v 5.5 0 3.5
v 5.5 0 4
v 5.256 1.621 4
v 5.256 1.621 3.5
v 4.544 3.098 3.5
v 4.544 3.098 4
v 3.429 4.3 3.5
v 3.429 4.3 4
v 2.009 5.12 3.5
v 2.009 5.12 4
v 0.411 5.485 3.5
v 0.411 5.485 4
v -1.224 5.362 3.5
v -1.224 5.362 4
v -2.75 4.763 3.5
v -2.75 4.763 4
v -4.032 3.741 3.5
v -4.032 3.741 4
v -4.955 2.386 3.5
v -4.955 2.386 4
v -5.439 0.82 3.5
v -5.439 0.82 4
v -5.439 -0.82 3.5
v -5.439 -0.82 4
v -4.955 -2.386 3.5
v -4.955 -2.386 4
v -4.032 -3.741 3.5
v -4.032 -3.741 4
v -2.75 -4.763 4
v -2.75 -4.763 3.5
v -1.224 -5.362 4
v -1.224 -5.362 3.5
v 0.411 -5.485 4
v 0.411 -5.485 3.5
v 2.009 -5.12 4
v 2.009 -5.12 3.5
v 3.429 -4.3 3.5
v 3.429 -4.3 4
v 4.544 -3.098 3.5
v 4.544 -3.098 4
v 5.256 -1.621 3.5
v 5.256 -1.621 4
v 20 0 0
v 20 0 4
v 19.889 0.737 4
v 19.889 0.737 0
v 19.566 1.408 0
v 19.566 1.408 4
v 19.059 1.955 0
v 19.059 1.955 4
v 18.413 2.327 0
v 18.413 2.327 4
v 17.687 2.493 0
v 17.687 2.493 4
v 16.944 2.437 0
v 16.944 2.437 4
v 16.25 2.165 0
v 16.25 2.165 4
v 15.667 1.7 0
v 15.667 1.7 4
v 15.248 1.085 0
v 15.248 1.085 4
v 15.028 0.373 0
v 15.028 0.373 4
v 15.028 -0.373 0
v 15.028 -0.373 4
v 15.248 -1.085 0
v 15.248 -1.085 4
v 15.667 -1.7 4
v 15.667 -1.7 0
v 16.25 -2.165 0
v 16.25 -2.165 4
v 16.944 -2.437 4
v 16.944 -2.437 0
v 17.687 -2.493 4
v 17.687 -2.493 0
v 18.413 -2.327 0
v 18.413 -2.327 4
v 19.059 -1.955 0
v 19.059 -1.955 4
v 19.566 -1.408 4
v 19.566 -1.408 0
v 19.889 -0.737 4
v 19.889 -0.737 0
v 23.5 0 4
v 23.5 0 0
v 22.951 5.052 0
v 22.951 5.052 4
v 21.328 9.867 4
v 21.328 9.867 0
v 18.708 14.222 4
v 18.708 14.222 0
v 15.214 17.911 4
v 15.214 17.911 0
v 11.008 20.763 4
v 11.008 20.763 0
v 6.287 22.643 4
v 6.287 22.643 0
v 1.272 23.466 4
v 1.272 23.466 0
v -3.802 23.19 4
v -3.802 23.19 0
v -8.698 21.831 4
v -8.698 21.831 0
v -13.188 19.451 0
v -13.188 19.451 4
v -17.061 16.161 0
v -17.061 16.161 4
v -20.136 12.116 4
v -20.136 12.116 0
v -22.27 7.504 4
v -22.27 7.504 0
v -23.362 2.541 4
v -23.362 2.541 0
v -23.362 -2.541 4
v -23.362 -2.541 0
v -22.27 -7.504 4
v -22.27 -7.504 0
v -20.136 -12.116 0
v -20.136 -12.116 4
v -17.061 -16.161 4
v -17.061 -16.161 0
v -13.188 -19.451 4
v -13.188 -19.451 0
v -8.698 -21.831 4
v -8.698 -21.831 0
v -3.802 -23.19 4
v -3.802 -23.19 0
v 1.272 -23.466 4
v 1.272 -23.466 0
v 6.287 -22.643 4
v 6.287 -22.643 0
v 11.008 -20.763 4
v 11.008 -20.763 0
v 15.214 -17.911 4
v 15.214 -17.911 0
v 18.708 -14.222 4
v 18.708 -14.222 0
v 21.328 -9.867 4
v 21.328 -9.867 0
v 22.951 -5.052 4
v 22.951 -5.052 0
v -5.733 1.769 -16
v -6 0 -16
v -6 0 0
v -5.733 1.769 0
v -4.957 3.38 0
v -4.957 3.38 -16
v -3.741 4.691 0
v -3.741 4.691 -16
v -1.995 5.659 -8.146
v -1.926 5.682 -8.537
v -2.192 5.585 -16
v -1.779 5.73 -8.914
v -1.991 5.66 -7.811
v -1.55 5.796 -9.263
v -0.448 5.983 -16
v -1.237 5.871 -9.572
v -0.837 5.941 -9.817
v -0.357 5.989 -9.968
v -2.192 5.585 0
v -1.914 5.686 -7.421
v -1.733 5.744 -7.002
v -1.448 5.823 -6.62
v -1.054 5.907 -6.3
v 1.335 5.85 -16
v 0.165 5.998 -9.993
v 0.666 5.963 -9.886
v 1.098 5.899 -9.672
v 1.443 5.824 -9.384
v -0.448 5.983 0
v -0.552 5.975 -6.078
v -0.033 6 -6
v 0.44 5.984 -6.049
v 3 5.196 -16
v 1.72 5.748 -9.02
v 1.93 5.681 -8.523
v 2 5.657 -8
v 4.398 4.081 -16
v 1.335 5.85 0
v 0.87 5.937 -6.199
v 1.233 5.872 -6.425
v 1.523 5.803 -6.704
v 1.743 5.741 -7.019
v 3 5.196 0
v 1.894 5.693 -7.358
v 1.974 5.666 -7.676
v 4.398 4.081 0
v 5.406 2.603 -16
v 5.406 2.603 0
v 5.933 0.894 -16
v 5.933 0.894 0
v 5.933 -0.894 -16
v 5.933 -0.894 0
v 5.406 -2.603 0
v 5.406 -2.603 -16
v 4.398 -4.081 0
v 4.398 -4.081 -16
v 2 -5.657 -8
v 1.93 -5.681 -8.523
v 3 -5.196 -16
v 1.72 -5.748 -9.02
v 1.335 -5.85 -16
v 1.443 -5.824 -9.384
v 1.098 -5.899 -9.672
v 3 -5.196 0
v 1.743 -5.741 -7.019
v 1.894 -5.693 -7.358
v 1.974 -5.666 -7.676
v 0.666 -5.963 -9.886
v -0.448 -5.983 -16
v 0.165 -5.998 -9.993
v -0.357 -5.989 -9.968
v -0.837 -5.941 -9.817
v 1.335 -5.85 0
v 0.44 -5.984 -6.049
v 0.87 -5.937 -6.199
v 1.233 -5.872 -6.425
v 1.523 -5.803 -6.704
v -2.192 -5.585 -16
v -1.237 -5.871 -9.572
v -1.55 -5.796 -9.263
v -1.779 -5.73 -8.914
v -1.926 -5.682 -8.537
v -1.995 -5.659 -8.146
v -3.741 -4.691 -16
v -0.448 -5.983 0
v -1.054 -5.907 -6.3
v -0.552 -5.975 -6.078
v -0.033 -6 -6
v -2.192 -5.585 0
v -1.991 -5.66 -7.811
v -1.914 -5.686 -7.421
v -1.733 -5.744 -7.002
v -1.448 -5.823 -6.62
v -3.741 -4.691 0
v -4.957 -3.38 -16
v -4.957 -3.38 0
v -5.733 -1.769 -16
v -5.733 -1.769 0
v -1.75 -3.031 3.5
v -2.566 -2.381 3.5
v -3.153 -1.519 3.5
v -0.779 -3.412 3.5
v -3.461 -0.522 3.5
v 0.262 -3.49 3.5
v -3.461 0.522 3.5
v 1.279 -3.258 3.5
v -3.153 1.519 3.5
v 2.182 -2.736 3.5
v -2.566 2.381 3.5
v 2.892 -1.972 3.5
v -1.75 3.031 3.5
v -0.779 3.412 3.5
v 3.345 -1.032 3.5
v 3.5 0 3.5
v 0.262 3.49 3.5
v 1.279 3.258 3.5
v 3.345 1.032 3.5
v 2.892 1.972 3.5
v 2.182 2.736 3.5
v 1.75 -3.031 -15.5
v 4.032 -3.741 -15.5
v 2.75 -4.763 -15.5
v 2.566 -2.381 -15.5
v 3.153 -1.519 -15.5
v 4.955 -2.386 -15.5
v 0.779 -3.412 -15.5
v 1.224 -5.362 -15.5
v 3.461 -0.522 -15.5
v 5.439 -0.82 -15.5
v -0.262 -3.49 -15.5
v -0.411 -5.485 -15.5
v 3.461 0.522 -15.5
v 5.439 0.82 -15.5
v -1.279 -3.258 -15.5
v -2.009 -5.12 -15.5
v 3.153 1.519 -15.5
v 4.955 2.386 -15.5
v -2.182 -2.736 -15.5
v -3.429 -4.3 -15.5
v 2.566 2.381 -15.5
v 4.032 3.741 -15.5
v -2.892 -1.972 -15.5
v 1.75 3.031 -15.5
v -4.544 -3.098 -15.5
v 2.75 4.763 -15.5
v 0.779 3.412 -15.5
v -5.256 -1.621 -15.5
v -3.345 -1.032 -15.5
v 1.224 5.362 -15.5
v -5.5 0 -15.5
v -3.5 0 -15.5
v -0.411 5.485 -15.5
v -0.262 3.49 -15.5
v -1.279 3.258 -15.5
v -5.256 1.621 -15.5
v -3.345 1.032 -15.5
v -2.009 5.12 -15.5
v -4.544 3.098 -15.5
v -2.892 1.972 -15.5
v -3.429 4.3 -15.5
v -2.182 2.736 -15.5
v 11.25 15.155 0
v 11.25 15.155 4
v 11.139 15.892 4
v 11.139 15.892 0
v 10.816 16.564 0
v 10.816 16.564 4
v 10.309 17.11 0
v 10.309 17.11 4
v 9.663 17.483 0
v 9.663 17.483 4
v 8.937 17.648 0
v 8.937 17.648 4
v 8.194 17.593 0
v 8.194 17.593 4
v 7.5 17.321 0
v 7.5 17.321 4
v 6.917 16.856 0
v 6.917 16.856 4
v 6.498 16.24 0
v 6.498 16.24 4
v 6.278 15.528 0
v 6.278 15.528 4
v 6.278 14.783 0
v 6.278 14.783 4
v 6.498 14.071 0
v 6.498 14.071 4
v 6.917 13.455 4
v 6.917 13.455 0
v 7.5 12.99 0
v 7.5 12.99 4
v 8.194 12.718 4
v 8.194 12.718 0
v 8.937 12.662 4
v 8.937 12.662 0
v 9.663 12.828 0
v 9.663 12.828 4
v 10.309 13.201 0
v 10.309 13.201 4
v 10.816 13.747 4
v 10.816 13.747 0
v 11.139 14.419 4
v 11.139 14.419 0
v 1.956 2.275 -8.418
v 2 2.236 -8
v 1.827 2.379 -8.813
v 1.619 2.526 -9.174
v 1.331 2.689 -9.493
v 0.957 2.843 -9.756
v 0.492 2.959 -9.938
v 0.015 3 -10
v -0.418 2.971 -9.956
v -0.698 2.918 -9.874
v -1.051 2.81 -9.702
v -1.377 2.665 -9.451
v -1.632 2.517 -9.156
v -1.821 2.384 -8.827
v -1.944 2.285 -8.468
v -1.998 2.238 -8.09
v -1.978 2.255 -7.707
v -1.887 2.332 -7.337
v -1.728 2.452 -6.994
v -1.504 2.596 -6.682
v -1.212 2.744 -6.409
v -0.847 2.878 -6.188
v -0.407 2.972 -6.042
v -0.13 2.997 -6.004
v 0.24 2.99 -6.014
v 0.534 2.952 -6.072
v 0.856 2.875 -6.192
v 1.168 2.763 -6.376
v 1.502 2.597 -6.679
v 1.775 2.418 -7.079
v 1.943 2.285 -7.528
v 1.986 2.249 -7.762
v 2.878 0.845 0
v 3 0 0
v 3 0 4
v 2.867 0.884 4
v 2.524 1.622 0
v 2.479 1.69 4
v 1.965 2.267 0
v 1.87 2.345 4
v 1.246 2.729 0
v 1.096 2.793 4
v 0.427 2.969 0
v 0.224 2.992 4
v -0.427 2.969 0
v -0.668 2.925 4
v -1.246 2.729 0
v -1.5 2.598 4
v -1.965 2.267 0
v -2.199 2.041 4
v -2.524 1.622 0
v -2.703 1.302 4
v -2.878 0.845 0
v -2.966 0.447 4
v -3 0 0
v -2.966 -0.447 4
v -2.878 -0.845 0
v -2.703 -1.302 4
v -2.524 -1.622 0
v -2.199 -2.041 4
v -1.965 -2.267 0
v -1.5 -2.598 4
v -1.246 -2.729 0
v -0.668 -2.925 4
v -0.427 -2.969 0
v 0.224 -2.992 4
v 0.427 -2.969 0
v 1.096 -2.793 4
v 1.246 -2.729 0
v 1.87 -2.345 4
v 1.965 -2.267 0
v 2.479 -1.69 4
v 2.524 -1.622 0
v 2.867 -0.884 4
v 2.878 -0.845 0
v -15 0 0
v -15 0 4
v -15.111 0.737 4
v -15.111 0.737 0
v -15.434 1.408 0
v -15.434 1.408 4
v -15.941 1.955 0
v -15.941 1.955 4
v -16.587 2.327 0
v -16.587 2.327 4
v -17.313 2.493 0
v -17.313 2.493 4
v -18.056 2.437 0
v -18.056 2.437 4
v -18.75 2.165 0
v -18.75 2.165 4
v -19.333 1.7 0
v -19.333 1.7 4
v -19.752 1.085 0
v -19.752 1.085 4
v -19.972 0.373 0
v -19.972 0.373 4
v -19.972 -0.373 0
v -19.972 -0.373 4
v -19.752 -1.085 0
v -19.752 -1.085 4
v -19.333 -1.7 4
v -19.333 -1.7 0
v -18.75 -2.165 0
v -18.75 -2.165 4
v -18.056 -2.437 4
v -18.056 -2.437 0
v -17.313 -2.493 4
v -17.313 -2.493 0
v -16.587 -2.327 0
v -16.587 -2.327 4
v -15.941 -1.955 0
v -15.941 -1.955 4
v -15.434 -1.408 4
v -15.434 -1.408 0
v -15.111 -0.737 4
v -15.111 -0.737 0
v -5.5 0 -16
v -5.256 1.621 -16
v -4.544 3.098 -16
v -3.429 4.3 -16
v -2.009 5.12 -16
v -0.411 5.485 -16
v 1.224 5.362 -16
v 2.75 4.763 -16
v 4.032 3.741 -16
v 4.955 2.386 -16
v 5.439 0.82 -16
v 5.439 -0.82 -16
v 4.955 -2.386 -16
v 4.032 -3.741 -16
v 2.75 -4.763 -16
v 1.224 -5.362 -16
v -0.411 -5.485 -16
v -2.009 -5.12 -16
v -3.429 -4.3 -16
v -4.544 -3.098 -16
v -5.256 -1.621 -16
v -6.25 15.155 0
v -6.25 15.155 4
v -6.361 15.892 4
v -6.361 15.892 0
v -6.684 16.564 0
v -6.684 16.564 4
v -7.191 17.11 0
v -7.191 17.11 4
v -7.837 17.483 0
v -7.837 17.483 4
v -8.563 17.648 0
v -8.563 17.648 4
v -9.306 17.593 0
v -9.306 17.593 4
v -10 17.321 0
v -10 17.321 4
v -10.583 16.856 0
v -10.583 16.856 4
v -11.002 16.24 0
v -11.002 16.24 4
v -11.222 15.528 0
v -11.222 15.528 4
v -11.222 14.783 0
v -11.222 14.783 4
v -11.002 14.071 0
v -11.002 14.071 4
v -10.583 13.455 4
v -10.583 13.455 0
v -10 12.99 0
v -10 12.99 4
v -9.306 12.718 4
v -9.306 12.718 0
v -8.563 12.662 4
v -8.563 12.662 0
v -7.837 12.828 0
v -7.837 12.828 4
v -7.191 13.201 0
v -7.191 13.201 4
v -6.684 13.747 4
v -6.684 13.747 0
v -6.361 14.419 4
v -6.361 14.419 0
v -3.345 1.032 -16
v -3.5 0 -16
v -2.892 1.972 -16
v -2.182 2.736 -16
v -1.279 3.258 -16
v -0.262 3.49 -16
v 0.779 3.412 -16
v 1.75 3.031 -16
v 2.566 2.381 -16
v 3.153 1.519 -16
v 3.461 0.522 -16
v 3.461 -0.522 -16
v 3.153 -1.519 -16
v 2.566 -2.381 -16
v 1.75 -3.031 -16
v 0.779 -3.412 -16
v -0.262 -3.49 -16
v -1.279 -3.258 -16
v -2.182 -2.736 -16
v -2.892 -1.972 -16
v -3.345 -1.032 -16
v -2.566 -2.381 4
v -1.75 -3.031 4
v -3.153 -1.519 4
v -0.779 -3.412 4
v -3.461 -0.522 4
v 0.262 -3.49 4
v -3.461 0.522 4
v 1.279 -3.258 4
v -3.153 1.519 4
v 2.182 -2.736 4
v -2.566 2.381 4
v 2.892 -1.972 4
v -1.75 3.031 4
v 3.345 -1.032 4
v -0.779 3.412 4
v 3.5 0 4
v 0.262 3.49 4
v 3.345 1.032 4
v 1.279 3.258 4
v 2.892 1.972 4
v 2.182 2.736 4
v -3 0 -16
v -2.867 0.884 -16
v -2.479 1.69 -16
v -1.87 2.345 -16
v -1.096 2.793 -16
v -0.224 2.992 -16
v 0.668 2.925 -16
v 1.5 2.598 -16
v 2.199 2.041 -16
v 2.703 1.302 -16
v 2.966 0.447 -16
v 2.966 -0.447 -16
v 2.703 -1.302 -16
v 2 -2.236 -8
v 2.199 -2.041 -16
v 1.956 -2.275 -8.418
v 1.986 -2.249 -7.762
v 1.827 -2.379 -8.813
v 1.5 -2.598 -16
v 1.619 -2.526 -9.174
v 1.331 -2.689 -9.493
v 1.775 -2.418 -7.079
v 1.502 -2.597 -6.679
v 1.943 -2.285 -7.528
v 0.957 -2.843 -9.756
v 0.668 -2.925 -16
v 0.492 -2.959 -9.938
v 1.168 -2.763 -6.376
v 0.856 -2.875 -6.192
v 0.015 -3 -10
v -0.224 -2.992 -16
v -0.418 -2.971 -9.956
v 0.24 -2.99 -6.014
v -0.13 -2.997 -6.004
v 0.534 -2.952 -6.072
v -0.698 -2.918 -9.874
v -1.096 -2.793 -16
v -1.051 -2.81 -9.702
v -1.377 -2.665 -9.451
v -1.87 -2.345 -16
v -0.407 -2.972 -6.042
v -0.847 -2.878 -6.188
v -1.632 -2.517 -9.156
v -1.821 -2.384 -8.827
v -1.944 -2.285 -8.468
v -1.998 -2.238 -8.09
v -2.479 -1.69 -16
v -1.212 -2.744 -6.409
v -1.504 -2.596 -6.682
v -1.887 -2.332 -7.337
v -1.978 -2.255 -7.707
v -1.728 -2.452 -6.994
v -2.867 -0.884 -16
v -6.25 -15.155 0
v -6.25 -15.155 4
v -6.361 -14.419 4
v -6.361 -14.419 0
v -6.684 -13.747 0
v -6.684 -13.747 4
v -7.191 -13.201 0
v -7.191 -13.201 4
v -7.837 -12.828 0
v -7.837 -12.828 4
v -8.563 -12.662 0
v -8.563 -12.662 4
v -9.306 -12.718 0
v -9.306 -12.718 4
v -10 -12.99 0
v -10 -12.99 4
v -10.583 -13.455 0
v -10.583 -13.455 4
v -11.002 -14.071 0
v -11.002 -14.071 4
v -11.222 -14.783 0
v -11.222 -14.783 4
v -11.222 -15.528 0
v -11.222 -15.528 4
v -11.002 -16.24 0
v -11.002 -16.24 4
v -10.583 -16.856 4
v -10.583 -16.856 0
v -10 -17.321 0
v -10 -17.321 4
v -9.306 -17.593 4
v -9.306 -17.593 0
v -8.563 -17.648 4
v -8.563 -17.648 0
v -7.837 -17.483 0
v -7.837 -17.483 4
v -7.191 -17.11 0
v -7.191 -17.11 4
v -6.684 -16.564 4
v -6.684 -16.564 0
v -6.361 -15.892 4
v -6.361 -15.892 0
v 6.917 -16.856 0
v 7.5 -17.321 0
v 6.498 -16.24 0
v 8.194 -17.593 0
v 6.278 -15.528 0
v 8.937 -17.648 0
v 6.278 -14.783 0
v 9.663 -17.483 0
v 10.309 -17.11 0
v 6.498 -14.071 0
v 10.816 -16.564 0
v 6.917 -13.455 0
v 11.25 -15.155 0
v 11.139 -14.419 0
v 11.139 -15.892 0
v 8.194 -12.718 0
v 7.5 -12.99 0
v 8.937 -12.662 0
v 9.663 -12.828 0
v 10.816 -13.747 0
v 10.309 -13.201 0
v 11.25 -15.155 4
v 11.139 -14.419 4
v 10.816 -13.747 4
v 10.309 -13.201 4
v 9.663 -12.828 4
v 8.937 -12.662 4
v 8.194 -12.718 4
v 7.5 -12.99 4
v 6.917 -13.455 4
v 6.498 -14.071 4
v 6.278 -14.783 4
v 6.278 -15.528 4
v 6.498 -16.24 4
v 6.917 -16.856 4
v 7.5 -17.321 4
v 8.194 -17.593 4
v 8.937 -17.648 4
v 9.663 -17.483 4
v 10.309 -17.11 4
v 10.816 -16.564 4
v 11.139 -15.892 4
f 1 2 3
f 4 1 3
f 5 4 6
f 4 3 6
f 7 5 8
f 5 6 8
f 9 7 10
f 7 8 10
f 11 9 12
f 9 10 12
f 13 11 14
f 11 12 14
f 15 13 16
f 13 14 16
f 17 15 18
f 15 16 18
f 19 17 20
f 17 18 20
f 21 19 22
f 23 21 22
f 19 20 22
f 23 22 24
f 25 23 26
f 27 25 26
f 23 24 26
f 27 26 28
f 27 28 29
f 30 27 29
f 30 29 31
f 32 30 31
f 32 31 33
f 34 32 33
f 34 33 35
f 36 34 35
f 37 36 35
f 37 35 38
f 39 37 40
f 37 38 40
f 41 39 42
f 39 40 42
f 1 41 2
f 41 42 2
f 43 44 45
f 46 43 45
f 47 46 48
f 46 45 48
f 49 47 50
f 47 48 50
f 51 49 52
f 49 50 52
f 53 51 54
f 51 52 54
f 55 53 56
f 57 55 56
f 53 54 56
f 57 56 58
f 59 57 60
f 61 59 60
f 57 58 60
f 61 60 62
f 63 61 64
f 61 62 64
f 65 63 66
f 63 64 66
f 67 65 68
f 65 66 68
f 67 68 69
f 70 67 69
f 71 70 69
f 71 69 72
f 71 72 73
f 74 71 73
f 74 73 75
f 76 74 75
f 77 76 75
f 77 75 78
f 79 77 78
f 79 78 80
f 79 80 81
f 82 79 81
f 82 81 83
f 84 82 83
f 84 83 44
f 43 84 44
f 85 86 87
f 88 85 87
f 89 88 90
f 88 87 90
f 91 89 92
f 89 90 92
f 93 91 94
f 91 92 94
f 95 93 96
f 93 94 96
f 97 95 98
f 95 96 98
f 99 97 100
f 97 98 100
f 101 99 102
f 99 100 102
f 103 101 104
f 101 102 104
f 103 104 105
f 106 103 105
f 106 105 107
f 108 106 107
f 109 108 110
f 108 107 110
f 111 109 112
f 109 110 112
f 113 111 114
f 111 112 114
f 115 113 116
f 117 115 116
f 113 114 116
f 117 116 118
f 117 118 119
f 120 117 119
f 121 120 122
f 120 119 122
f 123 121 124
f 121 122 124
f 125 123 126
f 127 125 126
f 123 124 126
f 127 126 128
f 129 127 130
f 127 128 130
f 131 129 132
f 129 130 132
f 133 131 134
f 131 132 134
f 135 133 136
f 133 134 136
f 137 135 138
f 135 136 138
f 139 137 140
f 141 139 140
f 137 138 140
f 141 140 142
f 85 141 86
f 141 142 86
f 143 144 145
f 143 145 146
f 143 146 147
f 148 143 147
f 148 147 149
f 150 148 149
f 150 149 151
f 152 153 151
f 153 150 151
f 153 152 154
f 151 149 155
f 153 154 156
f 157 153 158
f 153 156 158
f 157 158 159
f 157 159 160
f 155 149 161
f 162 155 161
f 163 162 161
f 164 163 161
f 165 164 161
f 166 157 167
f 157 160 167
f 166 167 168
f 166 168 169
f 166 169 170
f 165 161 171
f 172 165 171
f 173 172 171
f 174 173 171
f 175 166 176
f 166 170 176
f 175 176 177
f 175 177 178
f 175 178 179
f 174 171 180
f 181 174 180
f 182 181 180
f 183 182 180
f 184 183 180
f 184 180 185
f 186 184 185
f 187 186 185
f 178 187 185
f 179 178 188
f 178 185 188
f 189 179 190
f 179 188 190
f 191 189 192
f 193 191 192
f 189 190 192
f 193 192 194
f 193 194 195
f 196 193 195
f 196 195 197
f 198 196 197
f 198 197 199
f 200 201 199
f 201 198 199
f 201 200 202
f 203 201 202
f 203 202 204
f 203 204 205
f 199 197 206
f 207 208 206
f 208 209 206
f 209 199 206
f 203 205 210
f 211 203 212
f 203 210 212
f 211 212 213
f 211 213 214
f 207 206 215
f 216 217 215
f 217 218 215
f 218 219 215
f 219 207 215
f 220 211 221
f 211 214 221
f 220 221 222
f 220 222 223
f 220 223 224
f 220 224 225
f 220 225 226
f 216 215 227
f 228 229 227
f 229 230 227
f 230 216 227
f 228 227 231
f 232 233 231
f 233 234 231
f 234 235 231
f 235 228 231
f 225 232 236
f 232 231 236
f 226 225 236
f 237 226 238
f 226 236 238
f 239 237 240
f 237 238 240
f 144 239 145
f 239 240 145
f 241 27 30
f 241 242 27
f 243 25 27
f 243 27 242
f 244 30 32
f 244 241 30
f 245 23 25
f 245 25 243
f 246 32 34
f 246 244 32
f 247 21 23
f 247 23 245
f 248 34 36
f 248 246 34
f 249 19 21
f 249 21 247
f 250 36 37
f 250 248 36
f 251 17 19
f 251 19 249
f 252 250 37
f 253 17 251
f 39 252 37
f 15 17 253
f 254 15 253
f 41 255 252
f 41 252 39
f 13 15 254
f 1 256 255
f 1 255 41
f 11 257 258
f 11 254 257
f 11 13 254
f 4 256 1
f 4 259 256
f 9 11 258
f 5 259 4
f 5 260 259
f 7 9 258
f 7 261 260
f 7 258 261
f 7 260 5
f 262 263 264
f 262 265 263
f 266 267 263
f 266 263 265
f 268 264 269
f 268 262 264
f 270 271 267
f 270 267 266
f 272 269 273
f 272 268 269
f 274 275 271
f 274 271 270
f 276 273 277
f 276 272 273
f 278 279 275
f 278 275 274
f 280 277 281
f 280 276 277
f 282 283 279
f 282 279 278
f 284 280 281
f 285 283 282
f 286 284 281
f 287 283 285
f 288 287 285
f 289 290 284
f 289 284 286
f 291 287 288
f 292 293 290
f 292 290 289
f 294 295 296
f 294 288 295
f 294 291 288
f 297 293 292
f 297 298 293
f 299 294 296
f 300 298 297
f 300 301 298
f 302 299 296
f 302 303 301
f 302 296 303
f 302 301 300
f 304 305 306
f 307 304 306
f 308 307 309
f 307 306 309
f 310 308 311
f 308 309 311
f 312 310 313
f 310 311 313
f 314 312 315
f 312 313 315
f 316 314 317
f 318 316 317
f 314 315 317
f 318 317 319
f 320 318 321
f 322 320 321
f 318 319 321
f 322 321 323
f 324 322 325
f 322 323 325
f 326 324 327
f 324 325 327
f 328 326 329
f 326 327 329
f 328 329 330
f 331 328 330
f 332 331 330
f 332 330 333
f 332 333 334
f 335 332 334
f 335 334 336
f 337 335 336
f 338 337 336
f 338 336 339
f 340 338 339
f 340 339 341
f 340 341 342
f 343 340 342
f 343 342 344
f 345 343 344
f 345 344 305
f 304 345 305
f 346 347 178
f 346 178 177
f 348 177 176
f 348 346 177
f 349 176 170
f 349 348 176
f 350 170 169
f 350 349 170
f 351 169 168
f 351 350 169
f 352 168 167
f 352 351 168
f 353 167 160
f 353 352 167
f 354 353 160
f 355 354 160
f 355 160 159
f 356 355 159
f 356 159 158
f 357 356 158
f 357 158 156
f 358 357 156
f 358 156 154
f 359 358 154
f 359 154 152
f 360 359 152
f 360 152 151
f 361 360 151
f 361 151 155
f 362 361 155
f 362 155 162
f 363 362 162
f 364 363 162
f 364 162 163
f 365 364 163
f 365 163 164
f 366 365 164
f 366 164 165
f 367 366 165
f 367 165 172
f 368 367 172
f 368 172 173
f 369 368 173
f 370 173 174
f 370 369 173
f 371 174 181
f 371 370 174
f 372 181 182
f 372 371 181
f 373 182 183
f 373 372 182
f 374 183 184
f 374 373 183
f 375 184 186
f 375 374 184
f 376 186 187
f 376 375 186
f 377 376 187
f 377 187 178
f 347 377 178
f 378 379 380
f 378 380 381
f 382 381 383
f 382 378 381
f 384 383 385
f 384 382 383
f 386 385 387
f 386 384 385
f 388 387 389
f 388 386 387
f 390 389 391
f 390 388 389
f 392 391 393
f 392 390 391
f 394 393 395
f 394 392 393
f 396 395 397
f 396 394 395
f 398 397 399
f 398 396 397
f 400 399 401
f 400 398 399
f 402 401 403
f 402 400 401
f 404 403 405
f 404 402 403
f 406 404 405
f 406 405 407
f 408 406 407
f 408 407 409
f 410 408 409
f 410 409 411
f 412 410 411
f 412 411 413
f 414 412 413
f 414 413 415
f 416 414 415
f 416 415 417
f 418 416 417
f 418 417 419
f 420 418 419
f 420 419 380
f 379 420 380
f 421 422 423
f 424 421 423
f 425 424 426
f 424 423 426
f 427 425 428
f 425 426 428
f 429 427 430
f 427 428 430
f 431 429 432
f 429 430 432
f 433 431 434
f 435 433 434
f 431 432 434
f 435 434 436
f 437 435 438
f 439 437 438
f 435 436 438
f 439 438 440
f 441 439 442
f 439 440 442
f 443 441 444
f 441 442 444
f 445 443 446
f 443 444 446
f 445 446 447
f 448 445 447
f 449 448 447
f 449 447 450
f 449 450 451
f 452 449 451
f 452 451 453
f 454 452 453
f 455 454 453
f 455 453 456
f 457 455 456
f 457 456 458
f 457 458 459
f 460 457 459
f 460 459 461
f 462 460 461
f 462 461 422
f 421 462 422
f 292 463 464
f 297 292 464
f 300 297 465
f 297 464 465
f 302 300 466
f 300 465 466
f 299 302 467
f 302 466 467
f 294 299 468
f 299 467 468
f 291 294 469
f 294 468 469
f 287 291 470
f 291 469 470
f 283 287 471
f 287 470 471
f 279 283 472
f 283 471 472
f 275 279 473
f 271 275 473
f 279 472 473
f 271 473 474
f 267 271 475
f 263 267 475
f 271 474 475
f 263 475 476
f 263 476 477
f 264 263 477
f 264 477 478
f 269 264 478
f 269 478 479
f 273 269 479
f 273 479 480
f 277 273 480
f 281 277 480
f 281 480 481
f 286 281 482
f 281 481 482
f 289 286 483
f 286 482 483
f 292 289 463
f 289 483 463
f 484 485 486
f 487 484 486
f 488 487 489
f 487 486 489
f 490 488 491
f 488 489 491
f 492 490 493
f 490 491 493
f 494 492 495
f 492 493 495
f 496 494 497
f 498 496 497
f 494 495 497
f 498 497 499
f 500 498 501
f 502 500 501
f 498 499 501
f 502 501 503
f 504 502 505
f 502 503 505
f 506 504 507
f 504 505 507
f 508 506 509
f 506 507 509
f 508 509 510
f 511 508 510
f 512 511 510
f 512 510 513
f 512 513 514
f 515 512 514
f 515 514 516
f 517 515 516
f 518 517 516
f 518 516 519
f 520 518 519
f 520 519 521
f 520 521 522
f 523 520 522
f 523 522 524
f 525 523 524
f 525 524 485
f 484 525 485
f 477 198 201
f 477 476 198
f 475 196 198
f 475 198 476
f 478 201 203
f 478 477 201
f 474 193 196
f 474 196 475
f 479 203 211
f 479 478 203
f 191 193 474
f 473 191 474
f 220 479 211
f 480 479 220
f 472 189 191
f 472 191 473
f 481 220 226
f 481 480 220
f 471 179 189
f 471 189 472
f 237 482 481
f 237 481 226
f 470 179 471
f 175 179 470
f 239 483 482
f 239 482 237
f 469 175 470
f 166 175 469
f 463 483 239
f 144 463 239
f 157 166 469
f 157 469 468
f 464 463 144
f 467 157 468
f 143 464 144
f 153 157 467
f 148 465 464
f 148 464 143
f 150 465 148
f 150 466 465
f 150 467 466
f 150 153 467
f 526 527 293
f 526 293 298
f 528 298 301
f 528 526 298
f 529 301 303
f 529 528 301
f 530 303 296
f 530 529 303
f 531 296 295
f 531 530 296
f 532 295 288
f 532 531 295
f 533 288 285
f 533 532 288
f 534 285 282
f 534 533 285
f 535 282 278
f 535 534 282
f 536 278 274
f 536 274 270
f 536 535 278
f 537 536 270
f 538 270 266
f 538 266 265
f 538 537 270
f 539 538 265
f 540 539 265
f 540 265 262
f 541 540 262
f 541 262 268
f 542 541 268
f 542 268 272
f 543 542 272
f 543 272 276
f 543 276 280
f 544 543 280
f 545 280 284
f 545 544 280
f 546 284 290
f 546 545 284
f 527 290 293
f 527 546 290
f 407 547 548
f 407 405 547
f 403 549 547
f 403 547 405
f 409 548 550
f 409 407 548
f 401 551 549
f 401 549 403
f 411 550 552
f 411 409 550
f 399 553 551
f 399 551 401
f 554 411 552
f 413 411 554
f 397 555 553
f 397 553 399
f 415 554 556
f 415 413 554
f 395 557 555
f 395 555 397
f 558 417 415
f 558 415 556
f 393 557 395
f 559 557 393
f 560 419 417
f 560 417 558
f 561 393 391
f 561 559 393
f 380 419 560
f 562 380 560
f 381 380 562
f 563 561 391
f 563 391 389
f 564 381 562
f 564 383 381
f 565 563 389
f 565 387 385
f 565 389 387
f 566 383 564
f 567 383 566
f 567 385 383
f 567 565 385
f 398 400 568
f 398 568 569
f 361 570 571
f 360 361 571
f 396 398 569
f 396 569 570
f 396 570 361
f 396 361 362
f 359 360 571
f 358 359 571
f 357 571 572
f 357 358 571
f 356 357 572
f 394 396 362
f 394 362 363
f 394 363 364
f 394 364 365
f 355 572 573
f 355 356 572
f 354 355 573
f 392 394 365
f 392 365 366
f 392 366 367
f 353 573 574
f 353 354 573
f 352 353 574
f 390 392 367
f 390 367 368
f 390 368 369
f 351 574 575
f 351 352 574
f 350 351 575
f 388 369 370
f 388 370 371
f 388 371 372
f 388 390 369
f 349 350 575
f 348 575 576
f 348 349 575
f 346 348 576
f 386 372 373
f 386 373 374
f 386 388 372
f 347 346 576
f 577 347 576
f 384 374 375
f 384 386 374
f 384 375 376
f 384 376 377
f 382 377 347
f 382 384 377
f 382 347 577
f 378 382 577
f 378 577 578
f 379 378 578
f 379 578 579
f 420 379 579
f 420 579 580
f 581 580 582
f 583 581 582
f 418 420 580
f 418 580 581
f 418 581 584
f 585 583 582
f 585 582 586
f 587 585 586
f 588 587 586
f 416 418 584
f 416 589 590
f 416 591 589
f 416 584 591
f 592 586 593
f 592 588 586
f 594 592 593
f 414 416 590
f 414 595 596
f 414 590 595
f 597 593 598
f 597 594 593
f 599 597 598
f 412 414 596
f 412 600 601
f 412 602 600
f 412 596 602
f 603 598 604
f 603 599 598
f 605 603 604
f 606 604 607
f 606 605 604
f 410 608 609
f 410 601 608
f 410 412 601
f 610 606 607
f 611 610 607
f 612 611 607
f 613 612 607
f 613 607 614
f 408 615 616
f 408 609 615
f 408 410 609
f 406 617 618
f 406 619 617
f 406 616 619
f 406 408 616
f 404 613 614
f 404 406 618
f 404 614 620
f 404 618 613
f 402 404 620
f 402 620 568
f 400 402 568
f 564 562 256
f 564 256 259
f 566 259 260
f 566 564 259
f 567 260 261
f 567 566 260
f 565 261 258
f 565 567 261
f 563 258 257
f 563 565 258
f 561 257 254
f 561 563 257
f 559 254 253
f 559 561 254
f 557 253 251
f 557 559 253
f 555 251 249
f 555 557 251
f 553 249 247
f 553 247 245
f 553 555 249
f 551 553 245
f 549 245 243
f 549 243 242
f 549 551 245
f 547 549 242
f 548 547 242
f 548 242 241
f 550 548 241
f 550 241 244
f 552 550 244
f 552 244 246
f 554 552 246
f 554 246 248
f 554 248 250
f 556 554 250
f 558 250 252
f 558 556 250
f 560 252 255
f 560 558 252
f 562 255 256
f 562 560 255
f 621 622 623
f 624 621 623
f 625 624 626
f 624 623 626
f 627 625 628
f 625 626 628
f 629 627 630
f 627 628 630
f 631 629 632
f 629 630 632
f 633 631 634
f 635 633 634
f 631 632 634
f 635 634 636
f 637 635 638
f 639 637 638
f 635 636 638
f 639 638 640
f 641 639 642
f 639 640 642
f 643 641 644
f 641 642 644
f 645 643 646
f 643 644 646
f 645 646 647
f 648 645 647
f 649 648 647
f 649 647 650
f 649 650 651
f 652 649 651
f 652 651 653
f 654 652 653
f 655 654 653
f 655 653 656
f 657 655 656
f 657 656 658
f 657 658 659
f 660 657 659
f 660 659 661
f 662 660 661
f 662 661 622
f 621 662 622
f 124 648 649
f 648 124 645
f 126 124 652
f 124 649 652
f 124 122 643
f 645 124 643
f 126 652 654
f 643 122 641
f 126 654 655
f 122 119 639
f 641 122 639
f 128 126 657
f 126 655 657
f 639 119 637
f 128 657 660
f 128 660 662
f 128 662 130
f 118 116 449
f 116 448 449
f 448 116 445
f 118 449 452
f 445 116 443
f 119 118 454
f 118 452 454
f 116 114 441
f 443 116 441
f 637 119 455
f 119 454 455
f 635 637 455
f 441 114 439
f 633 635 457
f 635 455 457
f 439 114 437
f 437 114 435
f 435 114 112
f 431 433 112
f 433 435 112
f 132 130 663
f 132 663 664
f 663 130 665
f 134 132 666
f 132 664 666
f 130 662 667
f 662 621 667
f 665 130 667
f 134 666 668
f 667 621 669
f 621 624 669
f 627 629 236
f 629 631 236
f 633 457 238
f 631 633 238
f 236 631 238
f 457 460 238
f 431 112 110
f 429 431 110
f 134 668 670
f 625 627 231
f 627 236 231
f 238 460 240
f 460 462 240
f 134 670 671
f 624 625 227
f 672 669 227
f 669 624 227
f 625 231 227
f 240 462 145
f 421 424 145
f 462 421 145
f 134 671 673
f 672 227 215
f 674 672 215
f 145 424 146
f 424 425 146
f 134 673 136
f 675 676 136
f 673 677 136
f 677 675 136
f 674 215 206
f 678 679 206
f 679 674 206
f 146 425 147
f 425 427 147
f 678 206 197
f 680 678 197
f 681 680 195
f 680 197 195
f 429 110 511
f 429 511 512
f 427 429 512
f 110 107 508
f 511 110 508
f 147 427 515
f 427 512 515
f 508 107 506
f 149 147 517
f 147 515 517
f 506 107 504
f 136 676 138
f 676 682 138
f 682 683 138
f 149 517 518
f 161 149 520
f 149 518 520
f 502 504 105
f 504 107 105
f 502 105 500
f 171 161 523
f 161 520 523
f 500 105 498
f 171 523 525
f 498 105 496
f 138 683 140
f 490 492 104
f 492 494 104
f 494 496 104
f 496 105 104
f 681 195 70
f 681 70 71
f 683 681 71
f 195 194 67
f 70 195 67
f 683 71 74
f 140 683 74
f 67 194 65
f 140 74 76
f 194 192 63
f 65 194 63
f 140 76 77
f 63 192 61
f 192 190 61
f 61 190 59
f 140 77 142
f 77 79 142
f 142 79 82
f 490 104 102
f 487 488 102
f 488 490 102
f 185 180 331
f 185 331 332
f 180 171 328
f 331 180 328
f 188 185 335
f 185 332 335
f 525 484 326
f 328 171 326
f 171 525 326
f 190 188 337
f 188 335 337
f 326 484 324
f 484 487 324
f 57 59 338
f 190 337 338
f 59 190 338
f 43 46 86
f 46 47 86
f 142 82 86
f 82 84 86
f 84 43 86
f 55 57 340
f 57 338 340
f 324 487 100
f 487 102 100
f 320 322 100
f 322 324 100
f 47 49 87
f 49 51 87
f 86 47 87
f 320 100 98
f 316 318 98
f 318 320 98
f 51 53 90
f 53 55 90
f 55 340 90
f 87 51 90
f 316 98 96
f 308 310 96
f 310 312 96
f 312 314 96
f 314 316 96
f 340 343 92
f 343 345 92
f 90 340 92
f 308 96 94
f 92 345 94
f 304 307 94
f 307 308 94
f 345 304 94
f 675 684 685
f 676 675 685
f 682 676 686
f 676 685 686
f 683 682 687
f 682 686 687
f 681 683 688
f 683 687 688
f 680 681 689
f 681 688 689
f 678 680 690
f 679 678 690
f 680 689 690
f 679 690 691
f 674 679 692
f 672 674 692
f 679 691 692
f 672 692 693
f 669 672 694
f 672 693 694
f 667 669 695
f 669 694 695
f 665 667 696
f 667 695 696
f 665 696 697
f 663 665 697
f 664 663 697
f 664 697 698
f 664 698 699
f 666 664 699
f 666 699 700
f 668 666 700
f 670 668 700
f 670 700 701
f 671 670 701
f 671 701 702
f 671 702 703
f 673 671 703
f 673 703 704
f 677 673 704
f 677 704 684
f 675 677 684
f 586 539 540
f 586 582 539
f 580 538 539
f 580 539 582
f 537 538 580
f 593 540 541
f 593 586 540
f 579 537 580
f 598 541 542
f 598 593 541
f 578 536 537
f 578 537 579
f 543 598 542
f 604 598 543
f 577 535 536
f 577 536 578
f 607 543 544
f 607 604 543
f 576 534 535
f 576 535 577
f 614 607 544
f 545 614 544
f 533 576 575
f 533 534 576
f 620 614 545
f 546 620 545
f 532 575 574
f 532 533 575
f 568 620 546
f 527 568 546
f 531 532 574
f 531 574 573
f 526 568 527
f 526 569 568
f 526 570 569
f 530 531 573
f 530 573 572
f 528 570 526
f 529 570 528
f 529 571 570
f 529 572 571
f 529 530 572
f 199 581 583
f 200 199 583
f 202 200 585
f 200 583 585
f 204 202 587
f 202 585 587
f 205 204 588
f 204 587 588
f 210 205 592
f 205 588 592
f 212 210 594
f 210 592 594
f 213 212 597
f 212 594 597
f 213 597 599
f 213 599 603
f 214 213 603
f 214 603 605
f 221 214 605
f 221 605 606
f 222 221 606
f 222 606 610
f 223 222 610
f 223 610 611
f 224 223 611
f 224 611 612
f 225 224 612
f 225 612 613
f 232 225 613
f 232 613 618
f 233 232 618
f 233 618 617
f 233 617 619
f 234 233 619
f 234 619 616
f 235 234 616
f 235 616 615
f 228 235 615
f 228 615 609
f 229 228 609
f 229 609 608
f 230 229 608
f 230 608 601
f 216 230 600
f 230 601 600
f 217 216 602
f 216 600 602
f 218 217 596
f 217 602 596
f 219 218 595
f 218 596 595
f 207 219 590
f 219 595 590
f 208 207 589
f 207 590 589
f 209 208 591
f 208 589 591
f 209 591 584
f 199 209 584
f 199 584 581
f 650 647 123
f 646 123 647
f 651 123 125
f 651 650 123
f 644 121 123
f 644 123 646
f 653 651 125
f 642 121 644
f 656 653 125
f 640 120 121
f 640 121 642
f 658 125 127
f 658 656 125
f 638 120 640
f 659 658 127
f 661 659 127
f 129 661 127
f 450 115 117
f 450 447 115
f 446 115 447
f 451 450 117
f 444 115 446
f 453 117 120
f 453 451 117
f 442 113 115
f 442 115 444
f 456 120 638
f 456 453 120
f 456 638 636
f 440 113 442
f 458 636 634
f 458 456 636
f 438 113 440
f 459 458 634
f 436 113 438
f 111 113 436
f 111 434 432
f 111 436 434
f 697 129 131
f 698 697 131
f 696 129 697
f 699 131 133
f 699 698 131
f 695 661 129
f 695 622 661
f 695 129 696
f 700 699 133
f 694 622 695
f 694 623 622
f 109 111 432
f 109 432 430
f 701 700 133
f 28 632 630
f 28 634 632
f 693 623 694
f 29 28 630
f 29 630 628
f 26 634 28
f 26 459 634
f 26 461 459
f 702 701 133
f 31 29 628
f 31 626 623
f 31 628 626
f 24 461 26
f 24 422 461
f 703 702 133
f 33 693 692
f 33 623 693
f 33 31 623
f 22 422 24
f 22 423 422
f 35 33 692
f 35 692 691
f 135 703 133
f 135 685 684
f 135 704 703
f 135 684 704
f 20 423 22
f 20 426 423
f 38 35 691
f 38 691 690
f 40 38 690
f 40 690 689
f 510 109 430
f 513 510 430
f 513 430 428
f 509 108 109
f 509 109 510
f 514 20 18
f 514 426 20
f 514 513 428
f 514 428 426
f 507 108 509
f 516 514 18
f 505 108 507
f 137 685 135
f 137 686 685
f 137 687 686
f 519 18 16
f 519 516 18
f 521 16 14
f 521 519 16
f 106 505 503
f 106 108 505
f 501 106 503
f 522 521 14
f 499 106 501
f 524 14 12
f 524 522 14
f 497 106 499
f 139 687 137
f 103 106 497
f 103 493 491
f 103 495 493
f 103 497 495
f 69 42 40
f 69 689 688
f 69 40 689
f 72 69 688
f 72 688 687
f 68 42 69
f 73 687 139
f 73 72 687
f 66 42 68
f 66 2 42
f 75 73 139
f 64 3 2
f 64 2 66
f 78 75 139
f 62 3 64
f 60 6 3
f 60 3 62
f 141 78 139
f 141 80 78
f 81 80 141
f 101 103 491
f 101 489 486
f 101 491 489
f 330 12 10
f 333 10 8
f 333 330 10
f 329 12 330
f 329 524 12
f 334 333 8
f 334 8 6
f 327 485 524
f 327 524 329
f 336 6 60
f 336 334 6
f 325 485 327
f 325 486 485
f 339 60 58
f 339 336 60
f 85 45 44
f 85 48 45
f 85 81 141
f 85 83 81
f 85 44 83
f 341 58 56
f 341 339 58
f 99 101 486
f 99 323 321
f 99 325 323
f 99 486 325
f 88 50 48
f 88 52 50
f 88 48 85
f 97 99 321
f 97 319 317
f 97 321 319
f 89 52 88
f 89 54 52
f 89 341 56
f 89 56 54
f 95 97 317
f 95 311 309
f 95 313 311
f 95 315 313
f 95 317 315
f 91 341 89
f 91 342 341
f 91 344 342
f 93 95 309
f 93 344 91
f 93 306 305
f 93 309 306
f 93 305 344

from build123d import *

# Parameters (mm, degrees)
SKETCH1_R               = 23.5
SKETCH1_R_2             = 3
BOSS_EXTRUDE1_DEPTH     = 4
SKETCH2_R               = 6
SKETCH2_R_2             = 3
BOSS_EXTRUDE2_DEPTH     = 16
SKETCH3_R               = 2.5
CUT_EXTRUDE1_DEPTH      = 21
SKETCH5_R               = 5.5
SKETCH5_R_2             = 3.5
CUT_EXTRUDE3_DEPTH      = 0.5
SKETCH6_R               = 5.5
SKETCH6_R_2             = 3.5
CUT_EXTRUDE4_DEPTH      = 0.5
SKETCH7_R               = 2
CUT_EXTRUDE5_DEPTH      = 10
CUT_EXTRUDE5_DEPTH_BACK = 10


with BuildPart() as part:
    # Sketch1 → Boss-Extrude1 (new body)
    with BuildSketch(Plane.XY):
        Circle(SKETCH1_R)
        Circle(SKETCH1_R_2, mode=Mode.SUBTRACT)
    extrude(amount=BOSS_EXTRUDE1_DEPTH)

    # Sketch2 → Boss-Extrude2 (add)
    with BuildSketch(Plane(origin=(0, 0, 0), x_dir=(-1, 0, 0), z_dir=(0, 0, -1))):
        Circle(SKETCH2_R)
        Circle(SKETCH2_R_2, mode=Mode.SUBTRACT)
    extrude(amount=BOSS_EXTRUDE2_DEPTH)

    # Sketch3 → Cut-Extrude1 (cut, through all)
    with BuildSketch(Plane.XY.offset(4)):
        with Locations((-17.5, 0)):
            Circle(SKETCH3_R)
        with Locations((-8.75, 15.155444566)):
            Circle(SKETCH3_R)
        with Locations((8.75, 15.155444566)):
            Circle(SKETCH3_R)
        with Locations((17.5, 0)):
            Circle(SKETCH3_R)
        with Locations((8.75, -15.155444566)):
            Circle(SKETCH3_R)
        with Locations((-8.75, -15.155444566)):
            Circle(SKETCH3_R)
    extrude(amount=-CUT_EXTRUDE1_DEPTH, mode=Mode.SUBTRACT)

    # Sketch5 → Cut-Extrude3 (cut)
    with BuildSketch(Plane.XY.offset(4)):
        Circle(SKETCH5_R)
        Circle(SKETCH5_R_2, mode=Mode.SUBTRACT)
    extrude(amount=-CUT_EXTRUDE3_DEPTH, mode=Mode.SUBTRACT)

    # Sketch6 → Cut-Extrude4 (cut)
    with BuildSketch(Plane(origin=(0, 0, -16), x_dir=(-1, 0, 0), z_dir=(0, 0, -1))):
        Circle(SKETCH6_R)
        Circle(SKETCH6_R_2, mode=Mode.SUBTRACT)
    extrude(amount=-CUT_EXTRUDE4_DEPTH, mode=Mode.SUBTRACT)

    # Sketch7 → Cut-Extrude5 (cut, two sides)
    with BuildSketch(Plane(origin=(0, 0, 0), x_dir=(1, 0, 0), z_dir=(0, 1, 0))) as cut_extrude5_sk:
        with Locations((0, 8)):
            Circle(SKETCH7_R)
    extrude(amount=CUT_EXTRUDE5_DEPTH, mode=Mode.SUBTRACT)
    extrude(cut_extrude5_sk.sketch, amount=-CUT_EXTRUDE5_DEPTH_BACK, mode=Mode.SUBTRACT)


solid = part.part
